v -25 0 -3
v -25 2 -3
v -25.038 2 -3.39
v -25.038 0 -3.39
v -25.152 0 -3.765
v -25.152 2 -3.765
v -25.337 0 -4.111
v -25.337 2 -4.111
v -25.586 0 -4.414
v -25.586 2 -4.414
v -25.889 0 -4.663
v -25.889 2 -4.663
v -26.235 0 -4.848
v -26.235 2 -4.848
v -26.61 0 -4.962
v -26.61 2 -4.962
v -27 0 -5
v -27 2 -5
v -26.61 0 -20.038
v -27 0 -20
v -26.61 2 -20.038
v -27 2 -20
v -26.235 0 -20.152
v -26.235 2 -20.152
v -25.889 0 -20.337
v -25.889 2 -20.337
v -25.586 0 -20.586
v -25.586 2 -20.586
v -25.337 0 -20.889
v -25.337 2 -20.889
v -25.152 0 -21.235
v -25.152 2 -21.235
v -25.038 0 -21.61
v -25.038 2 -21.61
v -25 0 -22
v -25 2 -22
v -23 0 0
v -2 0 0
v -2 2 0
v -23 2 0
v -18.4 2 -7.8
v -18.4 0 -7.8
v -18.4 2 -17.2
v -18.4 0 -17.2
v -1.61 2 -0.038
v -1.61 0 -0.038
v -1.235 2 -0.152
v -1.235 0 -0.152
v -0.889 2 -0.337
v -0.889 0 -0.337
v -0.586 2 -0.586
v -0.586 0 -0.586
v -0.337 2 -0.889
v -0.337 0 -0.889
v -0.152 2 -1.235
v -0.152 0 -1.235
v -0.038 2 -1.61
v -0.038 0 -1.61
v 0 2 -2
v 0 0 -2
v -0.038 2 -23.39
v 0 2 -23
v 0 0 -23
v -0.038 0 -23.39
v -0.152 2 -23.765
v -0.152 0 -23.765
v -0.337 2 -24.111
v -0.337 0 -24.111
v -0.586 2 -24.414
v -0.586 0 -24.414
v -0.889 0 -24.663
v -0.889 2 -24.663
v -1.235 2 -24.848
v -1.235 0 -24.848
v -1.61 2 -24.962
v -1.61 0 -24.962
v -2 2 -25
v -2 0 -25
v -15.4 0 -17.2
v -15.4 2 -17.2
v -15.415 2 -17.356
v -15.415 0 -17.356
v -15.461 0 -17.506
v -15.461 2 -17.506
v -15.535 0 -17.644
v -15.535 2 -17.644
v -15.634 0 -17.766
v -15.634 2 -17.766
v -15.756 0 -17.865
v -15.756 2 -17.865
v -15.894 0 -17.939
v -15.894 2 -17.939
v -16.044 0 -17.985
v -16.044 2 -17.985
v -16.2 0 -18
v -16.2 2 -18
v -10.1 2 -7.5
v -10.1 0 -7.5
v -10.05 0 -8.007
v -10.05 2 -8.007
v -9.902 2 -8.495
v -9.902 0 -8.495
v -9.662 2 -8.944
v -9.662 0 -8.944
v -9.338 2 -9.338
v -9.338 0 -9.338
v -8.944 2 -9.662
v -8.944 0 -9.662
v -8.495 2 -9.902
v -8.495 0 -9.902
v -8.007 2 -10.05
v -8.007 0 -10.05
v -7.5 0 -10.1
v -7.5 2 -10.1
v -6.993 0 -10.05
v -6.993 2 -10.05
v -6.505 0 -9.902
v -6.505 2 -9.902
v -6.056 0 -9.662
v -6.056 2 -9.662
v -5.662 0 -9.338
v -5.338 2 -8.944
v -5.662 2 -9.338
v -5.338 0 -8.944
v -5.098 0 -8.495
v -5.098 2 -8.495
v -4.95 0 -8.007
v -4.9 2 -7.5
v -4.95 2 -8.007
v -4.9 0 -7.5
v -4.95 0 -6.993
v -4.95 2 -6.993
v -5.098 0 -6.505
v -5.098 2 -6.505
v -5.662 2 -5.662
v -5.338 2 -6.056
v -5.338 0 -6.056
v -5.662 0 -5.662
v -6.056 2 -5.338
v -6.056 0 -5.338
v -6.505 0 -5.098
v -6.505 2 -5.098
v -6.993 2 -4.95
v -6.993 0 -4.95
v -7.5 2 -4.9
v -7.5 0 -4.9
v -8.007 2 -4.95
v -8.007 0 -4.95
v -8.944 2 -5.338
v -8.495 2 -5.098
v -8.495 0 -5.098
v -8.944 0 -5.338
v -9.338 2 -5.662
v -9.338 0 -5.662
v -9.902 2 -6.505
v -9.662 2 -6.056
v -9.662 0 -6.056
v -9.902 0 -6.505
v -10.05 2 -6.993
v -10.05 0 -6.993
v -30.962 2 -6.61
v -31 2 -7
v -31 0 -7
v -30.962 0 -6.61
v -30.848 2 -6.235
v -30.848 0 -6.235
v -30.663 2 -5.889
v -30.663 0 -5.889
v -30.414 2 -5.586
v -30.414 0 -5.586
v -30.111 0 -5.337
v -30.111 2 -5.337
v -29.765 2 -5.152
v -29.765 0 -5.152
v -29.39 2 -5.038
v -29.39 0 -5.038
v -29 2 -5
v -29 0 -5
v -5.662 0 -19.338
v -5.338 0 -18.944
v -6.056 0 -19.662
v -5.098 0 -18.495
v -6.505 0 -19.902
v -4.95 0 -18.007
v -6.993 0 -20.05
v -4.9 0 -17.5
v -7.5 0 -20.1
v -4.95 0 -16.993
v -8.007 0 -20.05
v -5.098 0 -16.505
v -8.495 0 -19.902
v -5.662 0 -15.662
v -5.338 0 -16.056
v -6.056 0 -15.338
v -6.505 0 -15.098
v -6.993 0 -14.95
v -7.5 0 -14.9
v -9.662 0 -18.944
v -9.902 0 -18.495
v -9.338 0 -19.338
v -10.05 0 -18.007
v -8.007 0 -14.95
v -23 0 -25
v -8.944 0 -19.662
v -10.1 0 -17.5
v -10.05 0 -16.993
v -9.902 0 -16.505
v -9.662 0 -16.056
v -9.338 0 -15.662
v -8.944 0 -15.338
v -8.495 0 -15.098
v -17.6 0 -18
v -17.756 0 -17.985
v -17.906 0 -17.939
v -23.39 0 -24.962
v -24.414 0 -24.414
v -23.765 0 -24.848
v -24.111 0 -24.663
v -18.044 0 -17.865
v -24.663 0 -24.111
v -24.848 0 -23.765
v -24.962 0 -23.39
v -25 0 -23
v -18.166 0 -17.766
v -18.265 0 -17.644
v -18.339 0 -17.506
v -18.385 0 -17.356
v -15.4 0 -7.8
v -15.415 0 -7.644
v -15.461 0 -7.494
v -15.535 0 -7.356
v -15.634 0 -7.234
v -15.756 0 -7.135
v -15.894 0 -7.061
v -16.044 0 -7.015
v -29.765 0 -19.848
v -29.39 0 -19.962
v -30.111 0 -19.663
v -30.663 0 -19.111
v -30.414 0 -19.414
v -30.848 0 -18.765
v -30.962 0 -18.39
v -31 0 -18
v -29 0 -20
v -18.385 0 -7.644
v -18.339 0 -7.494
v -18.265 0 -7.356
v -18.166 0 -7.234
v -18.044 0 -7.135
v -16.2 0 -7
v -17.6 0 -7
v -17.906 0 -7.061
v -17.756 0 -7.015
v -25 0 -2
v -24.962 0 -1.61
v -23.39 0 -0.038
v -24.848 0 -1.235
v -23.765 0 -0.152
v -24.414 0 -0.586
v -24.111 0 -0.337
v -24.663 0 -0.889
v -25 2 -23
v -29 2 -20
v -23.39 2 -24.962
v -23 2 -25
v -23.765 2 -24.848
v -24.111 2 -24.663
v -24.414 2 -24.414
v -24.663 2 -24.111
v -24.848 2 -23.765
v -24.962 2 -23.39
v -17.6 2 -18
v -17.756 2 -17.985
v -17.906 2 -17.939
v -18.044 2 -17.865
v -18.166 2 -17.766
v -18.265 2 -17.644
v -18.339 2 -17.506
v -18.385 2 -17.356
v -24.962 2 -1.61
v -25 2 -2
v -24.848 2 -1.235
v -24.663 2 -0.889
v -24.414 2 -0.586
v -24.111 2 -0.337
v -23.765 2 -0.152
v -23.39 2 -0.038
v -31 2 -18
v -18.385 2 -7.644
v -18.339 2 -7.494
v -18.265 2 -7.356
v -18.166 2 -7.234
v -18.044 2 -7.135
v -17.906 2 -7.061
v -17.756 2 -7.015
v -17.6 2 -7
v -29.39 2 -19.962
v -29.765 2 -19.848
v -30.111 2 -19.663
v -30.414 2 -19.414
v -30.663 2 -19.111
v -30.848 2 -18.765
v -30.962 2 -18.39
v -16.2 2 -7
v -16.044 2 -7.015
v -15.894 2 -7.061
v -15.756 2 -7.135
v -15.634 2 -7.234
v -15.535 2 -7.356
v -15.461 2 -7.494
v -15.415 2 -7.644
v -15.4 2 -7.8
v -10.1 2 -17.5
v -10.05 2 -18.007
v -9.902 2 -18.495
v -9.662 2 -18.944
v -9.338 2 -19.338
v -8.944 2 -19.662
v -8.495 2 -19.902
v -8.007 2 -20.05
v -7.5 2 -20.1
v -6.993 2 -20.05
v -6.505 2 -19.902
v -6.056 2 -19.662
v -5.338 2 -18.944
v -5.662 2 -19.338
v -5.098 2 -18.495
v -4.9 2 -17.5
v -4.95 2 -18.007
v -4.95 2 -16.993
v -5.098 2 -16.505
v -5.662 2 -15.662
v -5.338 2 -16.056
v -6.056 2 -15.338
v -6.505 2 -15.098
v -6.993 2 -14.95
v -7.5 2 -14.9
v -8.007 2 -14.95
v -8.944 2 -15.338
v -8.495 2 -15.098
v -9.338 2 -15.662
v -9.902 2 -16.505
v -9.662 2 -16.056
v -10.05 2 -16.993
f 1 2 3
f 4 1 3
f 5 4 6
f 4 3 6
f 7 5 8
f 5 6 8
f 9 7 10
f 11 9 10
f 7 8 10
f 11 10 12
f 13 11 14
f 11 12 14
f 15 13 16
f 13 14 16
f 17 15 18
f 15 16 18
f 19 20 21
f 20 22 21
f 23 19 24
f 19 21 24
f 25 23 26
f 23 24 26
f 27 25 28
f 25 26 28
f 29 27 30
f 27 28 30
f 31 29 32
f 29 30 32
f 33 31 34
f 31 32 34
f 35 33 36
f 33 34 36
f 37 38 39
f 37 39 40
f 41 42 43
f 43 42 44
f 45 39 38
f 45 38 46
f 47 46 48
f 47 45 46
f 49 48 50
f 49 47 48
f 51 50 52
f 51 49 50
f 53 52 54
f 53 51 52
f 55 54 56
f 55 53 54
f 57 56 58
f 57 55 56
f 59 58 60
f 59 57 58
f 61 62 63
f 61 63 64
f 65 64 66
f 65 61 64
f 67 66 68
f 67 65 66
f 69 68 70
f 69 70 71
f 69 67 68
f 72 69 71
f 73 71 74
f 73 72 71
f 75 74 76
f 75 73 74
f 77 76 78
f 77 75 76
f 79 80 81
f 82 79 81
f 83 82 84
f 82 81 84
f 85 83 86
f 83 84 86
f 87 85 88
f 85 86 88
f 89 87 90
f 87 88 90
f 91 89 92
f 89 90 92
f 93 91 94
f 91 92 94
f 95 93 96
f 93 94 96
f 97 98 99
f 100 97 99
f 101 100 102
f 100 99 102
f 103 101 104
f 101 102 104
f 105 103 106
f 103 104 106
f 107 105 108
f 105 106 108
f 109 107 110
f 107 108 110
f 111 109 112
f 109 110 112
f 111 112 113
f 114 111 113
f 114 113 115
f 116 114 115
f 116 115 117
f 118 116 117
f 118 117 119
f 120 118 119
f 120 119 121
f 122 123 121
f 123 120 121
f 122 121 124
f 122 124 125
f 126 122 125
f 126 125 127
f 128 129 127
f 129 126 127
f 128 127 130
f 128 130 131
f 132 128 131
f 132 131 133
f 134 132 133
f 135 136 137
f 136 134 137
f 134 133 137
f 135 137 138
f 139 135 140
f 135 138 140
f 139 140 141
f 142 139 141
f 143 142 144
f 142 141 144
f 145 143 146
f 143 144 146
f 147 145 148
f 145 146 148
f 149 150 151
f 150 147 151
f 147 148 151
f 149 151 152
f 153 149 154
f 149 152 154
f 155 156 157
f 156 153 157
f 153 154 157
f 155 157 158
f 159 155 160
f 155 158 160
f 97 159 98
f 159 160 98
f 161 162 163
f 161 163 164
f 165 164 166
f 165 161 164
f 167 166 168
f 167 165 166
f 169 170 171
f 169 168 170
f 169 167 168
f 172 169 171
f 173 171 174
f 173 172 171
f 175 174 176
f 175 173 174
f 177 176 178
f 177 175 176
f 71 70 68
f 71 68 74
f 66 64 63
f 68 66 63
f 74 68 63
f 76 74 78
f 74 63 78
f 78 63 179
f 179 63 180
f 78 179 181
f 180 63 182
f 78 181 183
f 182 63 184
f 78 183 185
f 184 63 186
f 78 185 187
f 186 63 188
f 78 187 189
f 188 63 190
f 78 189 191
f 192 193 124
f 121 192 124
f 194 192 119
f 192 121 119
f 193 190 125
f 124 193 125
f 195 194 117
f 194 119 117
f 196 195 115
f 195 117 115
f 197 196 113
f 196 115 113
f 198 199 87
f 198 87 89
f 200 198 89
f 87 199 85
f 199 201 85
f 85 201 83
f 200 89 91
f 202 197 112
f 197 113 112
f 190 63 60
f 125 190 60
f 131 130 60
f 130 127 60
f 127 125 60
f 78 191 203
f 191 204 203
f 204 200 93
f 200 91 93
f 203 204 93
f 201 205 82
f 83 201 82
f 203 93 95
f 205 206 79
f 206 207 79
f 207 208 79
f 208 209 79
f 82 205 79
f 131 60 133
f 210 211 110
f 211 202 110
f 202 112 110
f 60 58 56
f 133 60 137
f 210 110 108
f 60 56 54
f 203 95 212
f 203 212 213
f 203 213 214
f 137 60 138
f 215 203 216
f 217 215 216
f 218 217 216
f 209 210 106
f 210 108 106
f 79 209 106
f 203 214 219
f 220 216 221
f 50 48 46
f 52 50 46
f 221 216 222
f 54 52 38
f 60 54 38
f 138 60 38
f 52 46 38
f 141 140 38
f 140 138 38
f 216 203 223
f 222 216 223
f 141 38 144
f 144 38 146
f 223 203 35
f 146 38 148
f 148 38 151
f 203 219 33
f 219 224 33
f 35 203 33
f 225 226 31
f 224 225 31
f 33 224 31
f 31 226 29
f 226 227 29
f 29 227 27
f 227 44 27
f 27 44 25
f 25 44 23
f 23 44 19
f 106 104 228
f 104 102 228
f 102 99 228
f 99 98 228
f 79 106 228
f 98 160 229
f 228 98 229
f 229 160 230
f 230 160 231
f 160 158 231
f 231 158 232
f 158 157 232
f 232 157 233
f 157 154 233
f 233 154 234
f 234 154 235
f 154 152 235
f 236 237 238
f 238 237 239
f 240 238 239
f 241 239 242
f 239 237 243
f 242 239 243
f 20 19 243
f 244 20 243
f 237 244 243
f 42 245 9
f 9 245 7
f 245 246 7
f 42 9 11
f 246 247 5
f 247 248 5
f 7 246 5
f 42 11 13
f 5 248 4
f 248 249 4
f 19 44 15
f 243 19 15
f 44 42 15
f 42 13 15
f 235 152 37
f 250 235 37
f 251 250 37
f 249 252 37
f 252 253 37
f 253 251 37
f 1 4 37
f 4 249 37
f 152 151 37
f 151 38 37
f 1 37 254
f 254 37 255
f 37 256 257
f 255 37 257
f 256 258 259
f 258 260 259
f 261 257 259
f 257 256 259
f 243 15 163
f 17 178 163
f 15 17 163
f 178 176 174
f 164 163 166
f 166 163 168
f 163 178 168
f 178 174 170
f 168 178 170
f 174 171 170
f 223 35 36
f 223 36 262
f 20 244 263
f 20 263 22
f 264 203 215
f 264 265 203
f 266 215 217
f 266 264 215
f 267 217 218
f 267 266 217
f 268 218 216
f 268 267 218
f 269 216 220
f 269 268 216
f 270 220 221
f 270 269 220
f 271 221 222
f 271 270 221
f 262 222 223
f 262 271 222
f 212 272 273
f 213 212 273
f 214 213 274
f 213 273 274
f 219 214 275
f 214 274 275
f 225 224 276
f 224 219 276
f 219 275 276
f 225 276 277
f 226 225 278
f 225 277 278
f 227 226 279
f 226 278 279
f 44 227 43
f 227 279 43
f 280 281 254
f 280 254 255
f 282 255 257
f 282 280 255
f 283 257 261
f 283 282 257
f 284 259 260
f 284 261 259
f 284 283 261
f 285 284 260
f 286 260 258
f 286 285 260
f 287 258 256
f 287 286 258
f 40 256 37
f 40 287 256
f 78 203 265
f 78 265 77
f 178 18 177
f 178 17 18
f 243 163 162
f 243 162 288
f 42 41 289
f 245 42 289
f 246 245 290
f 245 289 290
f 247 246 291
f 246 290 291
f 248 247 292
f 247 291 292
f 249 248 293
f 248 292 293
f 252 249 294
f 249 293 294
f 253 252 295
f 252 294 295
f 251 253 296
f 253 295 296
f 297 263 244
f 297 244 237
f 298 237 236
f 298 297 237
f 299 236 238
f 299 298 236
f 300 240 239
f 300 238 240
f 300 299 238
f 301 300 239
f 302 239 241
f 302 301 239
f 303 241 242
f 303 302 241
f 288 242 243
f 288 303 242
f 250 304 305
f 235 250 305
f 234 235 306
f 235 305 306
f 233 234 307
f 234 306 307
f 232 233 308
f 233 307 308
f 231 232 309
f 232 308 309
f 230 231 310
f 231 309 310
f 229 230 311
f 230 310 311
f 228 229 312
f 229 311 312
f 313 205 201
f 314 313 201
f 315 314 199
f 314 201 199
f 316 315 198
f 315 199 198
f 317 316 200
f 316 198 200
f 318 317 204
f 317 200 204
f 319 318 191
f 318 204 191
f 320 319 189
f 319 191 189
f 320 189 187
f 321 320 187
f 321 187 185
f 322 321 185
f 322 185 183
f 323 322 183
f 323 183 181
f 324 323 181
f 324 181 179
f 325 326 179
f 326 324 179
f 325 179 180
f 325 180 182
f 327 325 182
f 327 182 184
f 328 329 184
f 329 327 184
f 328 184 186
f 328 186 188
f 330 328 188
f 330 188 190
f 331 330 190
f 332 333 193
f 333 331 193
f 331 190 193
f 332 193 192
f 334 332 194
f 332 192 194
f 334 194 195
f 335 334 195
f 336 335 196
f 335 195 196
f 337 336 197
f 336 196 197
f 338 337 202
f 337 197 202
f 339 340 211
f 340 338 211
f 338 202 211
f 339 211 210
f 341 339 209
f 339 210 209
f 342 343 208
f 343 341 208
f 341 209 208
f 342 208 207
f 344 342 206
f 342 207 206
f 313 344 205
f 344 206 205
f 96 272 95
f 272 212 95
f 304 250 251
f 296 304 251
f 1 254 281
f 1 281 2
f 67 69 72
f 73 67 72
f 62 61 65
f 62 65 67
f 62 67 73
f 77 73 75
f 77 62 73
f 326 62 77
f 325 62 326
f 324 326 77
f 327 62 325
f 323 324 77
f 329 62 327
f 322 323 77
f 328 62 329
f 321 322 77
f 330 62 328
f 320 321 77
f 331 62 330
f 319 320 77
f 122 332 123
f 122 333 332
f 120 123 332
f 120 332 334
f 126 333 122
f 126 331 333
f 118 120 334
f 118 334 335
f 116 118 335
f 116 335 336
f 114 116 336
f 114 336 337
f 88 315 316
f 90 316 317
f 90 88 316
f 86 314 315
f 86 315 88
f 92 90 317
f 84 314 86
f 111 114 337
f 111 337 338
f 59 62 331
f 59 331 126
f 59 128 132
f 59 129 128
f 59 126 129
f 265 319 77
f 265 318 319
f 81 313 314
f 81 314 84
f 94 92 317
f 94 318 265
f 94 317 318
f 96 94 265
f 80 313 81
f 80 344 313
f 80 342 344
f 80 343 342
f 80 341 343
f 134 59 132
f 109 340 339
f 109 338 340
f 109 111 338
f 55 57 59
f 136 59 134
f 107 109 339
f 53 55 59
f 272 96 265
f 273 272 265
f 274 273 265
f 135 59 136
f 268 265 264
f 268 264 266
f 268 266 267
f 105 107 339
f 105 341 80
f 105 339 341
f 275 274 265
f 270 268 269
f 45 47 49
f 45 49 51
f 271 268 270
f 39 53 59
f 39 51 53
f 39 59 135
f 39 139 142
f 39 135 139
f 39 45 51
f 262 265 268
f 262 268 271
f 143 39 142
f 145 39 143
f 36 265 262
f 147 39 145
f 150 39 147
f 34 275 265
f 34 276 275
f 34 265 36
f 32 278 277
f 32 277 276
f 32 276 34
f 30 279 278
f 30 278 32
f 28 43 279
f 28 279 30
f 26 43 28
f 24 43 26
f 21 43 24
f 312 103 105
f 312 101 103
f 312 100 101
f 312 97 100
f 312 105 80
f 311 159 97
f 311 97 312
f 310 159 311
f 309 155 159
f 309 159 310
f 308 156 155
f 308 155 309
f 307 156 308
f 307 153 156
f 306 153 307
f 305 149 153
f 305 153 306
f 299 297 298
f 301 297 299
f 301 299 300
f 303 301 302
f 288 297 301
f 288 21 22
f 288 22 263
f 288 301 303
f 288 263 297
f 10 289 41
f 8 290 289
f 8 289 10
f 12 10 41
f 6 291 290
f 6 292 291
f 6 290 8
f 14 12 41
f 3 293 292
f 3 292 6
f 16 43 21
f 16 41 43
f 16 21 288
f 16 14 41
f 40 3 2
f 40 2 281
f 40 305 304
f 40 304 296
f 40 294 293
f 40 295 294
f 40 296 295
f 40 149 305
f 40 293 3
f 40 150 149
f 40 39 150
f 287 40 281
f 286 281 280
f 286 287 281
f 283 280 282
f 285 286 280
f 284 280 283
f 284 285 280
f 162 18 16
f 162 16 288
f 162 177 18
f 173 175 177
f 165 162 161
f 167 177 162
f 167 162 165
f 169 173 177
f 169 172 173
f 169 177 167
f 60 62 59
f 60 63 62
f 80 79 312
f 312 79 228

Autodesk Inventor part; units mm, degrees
ref_plane "YZ Plane" through (0, 0, 0) normal (1, 0, 0) x (0, 1, 0)
ref_plane "XZ Plane" through (0, 0, 0) normal (0, 1, 0) x (-1, 0, 0)
ref_plane "XY Plane" through (0, 0, 0) normal (0, 0, 1) x (1, 0, 0)
sketch "Szkic1" plane through (0, 0, 0) normal (0, 1, 0) x (-1, 0, 0)
  line L0 (0, 0) -> (25, 0)
  line L1 (25, 0) -> (25, -25)
  line L2 (25, -25) -> (0, -25)
  line L3 (0, -25) -> (0, 0)
  line L4 (25, -5) -> (31, -5)
  line L5 (31, -5) -> (31, -20)
  line L6 (31, -20) -> (25, -20)
  line L7 (25, -20) -> (25, -5)
  circle A0 centre (7.5, -7.5) radius 2.6
  circle A1 centre (7.5, -17.5) radius 2.6
  line L8 (25, -12.5) -> (0, -12.5) construction
  line L9 (18.4, -18) -> (15.4, -18)
  line L10 (15.4, -18) -> (15.4, -7)
  line L11 (15.4, -7) -> (18.4, -7)
  line L12 (18.4, -7) -> (18.4, -18)
  dimension "d0" = 5.2
  dimension "d1" = 25
  dimension "d2" = 25
  dimension "d3" = 7.5
  dimension "d4" = 10
  dimension "d5" = 6
  dimension "d6" = 15
  dimension "d10" = 18.4
  dimension "d11" = 11
  dimension "d12" = 3
extrude "Wyciągnięcie proste1" add sketch "Szkic1" along normal blind 2
fillet "Zaokrąglenie1" radius 2 8 edges at (0, 1, 0) (0, 1, -25) (-25, 1, 0) (-25, 1, -5) (-31, 1, -5) (-31, 1, -20) (-25, 1, -20) (-25, 1, -25)
fillet "Zaokrąglenie2" radius 0.8 4 edges at (-18.4, 1, -18) (-15.4, 1, -18) (-18.4, 1, -7) (-15.4, 1, -7)
properties part number "pokrywka" material "PLA"
